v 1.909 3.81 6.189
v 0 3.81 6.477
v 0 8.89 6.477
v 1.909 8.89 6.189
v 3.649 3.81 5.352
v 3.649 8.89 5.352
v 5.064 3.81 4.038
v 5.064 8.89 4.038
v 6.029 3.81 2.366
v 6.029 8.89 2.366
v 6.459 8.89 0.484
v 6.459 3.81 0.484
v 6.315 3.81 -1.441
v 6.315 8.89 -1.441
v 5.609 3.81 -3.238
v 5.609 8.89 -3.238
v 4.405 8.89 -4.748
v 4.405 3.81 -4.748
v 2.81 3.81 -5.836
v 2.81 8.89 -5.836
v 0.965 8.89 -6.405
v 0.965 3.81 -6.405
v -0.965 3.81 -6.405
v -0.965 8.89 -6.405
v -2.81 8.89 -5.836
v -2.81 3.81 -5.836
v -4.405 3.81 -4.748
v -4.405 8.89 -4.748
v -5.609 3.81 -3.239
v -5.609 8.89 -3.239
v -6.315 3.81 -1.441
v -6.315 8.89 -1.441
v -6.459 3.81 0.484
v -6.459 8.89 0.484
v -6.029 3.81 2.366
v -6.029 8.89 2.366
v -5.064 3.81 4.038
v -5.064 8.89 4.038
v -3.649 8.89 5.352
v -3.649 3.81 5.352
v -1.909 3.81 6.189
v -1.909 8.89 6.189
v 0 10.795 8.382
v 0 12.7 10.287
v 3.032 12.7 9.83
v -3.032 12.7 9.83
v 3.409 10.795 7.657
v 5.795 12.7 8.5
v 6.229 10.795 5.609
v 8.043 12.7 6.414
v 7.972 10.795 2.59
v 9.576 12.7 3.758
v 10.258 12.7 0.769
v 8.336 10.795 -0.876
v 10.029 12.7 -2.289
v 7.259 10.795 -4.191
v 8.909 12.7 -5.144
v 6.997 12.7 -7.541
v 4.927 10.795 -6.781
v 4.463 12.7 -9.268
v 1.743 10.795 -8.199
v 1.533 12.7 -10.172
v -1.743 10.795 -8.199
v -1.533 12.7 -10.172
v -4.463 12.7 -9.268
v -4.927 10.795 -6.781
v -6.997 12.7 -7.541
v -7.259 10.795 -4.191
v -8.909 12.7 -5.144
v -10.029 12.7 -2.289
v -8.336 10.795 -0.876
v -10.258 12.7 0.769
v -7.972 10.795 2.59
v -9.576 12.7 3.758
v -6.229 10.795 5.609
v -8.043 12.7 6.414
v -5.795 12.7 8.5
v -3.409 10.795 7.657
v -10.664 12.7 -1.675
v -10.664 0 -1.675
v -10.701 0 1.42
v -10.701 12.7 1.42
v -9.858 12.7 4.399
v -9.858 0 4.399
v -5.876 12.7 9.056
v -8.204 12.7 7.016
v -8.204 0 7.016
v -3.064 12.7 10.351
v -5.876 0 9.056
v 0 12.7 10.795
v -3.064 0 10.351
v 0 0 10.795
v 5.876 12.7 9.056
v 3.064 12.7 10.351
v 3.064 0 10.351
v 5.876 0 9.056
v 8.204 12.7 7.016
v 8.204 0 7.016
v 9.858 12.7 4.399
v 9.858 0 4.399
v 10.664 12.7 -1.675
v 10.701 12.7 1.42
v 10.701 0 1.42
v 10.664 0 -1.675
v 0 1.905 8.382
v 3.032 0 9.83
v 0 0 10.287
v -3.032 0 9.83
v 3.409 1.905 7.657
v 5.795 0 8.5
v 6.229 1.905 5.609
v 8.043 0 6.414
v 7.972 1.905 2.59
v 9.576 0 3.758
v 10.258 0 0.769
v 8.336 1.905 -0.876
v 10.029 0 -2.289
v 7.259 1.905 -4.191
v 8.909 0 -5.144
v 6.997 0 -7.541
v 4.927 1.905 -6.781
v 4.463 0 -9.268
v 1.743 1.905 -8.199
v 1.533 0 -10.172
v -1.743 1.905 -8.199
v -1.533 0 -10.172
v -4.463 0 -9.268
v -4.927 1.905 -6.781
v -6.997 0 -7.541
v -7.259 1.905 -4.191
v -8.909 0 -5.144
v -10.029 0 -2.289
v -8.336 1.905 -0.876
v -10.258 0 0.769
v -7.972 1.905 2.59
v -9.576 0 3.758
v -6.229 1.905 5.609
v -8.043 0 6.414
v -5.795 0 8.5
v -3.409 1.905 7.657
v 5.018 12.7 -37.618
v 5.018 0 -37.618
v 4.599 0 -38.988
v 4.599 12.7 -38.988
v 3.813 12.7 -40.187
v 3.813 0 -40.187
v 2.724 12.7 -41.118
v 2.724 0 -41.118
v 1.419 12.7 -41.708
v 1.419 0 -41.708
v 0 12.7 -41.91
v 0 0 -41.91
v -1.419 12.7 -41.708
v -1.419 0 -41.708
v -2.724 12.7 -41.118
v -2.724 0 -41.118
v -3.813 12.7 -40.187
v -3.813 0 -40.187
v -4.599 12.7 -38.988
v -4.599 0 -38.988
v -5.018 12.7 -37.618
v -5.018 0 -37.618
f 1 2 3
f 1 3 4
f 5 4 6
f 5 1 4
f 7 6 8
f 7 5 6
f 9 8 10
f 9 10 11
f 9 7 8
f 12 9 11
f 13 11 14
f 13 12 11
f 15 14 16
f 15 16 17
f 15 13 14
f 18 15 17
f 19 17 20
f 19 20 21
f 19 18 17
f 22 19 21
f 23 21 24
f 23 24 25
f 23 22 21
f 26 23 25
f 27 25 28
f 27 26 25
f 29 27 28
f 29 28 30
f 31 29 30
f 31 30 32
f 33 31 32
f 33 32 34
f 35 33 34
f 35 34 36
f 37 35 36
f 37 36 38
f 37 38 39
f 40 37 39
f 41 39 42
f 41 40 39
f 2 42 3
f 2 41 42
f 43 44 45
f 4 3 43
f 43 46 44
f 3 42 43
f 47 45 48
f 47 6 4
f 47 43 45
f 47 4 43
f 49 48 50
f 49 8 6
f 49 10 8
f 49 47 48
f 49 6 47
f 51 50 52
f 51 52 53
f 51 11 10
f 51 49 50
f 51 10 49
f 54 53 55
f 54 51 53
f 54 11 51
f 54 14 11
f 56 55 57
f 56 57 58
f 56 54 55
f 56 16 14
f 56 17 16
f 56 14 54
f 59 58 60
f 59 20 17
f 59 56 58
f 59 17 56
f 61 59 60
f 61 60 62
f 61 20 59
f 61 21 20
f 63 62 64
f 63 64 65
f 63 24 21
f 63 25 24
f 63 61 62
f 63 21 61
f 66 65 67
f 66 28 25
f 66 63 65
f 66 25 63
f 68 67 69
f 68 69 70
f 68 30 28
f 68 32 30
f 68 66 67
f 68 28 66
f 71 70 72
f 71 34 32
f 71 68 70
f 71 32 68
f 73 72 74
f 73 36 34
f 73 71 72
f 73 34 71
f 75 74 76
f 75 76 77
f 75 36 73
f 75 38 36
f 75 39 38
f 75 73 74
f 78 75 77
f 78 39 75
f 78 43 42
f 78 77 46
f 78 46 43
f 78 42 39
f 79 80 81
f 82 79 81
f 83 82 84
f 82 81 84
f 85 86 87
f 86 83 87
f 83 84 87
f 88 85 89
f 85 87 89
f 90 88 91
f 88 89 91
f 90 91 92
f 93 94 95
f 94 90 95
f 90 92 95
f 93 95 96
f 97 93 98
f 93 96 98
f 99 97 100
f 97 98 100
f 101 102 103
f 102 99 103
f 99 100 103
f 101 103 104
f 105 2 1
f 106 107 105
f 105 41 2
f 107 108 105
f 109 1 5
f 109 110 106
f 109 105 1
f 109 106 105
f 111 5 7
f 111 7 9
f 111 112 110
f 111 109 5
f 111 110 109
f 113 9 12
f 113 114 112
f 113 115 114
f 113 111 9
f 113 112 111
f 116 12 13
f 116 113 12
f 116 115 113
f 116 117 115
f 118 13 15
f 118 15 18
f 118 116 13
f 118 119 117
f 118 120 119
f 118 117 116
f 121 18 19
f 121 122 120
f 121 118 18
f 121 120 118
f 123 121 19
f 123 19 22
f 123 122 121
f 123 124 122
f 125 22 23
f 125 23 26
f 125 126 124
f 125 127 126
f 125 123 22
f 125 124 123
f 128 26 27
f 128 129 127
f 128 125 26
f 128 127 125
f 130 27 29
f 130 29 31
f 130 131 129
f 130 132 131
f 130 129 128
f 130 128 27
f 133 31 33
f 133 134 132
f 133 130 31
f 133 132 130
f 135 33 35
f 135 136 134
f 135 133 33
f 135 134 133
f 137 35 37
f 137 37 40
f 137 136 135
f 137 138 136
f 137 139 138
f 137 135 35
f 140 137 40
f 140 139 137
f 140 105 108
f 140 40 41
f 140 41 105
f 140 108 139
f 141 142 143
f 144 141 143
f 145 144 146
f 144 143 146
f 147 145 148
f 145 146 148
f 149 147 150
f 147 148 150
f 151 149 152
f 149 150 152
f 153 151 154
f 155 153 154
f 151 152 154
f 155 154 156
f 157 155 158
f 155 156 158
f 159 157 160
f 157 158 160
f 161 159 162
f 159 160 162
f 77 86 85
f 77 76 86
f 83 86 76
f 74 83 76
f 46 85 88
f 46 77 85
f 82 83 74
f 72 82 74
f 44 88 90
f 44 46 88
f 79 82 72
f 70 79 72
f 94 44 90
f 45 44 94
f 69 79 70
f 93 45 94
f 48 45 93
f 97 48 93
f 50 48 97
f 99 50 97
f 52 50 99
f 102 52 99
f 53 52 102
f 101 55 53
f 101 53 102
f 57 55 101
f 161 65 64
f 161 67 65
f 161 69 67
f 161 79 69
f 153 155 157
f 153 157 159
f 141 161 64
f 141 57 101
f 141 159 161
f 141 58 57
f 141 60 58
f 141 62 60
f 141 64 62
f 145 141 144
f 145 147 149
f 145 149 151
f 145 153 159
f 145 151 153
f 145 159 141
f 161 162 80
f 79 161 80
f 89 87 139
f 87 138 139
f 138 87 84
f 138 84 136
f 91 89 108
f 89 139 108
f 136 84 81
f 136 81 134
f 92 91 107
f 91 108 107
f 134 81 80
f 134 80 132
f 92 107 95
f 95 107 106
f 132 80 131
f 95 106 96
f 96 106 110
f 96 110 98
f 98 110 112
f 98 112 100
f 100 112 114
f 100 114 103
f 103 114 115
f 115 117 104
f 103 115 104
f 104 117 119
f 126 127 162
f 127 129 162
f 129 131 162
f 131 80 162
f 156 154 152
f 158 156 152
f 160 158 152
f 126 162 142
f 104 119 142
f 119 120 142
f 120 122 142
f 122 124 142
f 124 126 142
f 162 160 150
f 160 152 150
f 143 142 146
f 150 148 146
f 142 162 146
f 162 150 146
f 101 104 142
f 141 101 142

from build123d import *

# Parameters (mm, degrees)
SKETCH1_R           = 10.795
SKETCH1_R_2         = 6.477
BOSS_EXTRUDE1_DEPTH = 12.7
CHAMFER1_SIZE       = 3.81


with BuildPart() as part:
    # Sketch1 → Boss-Extrude1 (new body)
    # profile 1 of 2: a face of its own
    with BuildSketch(Plane(origin=(0, 0, 0), x_dir=(1, 0, 0), z_dir=(0, 1, 0))):
        with BuildLine():
            Line((-5.01846801, 37.618275862), (-10.664244521, 1.675086207))
            ThreePointArc((-10.664244521, 1.675086207), (0, 10.795), (10.664244521, 1.675086207))
            Line((10.664244521, 1.675086207), (5.01846801, 37.618275862))
            ThreePointArc((5.01846801, 37.618275862), (0, 41.91), (-5.01846801, 37.618275862))
        make_face()
    # profile 2 of 2: a face of its own
    with BuildSketch(Plane(origin=(0, 0, 0), x_dir=(1, 0, 0), z_dir=(0, 1, 0))):
        Circle(SKETCH1_R)
        with Locations(Location((0, 0, 0), (0, 0, 270))):
            Circle(SKETCH1_R_2, mode=Mode.SUBTRACT)
    extrude(amount=BOSS_EXTRUDE1_DEPTH)

    # Chamfer1
    chamfer1_edges = [part.edges().sort_by_distance(p)[0] for p in [
        (0, 12.7, -6.477),
        (0, 0, -6.477),
    ]]
    chamfer(chamfer1_edges, length=CHAMFER1_SIZE)


solid = part.part
